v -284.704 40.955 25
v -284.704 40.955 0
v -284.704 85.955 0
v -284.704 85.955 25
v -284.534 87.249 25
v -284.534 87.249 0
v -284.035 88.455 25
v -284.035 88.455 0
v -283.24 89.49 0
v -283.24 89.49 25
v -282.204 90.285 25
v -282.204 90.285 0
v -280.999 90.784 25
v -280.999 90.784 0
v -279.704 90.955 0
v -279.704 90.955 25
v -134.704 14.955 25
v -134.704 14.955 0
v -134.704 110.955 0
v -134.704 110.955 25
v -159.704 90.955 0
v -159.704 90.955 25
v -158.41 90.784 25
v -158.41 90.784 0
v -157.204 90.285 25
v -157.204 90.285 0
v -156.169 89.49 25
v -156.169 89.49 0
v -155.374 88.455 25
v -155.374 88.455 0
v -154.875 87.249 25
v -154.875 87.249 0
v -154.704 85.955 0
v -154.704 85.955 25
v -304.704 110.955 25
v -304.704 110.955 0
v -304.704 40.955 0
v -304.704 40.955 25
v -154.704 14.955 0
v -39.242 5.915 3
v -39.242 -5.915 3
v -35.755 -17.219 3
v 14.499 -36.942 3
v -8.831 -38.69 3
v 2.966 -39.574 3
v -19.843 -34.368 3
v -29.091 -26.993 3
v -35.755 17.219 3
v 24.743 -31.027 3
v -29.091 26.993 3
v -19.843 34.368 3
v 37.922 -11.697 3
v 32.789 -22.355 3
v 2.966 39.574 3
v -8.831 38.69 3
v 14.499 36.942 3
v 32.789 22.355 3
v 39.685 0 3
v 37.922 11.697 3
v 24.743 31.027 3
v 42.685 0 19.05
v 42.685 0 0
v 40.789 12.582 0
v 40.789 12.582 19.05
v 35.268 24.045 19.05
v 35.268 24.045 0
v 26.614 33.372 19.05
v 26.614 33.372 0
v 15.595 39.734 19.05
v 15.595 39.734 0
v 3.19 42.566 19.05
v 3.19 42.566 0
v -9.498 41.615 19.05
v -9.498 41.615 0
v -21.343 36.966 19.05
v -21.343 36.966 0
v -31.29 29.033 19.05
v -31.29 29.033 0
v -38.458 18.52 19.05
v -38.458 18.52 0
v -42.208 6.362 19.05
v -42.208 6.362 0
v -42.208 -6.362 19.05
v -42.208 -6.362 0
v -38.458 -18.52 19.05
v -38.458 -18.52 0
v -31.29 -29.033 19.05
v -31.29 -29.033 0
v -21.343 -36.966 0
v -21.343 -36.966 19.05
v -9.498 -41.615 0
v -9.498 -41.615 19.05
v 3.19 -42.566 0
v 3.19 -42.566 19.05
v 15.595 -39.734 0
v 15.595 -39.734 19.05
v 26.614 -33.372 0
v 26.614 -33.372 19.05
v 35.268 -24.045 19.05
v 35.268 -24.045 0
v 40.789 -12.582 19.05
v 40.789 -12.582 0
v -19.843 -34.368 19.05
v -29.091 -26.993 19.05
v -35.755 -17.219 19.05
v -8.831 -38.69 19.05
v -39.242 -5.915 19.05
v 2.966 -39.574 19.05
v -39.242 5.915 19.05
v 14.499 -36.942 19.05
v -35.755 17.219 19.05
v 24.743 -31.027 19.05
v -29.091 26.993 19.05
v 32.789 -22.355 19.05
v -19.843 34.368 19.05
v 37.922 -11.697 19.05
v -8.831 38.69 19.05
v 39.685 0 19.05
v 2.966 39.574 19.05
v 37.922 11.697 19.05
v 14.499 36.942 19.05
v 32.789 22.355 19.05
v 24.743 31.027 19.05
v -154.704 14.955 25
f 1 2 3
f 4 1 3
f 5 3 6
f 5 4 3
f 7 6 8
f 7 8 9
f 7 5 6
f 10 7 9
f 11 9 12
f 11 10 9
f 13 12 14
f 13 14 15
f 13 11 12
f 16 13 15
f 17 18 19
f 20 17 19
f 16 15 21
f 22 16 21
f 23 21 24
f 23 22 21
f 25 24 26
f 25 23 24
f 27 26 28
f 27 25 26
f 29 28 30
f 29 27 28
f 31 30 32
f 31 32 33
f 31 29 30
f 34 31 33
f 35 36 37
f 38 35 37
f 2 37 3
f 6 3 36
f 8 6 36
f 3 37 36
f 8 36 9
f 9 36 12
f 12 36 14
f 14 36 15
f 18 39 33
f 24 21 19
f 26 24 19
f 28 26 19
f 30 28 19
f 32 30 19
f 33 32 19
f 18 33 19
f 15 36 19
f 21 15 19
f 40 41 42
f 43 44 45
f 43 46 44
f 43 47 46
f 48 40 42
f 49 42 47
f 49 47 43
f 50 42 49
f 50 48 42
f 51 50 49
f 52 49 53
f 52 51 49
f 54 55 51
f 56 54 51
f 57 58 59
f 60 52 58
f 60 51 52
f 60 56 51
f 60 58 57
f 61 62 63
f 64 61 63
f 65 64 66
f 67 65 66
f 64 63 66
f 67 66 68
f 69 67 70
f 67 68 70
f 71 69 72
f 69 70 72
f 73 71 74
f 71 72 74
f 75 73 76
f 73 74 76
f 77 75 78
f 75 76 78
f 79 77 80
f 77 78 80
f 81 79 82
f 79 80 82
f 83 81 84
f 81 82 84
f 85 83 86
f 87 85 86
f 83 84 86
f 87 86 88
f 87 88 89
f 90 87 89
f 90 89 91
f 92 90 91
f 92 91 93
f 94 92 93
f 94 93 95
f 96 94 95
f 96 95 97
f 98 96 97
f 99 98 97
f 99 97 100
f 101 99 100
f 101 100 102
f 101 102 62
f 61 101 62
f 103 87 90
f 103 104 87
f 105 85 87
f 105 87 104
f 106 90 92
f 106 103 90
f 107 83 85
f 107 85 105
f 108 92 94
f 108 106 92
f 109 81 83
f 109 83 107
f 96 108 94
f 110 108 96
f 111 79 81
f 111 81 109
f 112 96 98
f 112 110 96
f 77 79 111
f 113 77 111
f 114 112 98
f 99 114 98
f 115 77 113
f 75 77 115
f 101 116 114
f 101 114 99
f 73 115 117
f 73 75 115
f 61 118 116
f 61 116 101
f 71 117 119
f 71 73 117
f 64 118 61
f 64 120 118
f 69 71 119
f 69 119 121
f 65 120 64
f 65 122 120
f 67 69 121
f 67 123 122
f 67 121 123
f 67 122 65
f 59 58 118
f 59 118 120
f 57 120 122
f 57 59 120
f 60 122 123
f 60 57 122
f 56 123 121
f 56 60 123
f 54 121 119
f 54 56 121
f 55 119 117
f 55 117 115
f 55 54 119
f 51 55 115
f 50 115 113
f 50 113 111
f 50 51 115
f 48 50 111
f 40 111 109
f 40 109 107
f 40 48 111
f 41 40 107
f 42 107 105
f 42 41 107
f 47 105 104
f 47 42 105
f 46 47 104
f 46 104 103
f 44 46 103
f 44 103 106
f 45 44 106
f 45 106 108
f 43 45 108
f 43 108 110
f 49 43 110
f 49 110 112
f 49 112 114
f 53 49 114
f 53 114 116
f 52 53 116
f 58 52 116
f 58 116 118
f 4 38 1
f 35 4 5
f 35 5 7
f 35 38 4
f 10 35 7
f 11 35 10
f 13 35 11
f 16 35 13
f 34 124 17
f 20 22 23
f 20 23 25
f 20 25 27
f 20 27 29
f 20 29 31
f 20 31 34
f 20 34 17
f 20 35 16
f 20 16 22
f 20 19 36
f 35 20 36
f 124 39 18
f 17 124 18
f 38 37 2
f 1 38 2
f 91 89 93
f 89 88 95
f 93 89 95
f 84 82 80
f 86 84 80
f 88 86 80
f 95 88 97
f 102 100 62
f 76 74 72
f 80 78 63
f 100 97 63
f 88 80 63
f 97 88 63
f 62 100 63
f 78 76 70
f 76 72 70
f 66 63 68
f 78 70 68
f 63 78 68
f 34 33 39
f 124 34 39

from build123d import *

# Parameters (mm, degrees)
F0_R     = 42.685
F0_R_2   = 39.685
F1_DEPTH = 3
F2_DEPTH = 19.05
F4_DEPTH = 25
F5_R     = 5


with BuildPart() as f1:
    # F0 (on Top) → F1 (new body)
    with BuildSketch(Plane.XY):
        Circle(F0_R)
        Circle(F0_R_2, mode=Mode.SUBTRACT)
        Circle(F0_R_2)
    extrude(amount=F1_DEPTH)

    # F0 (on Top) → F2 (join)
    with BuildSketch(Plane.XY):
        Circle(F0_R)
        Circle(F0_R_2, mode=Mode.SUBTRACT)
    extrude(amount=F2_DEPTH)


with BuildPart() as f4:
    # F3 (on Top) → F4 (new body)
    with BuildSketch(Plane.XY):
        Polygon((-304.7044279708, 40.9547965858), (-284.7044279708, 40.9547965858), (-284.7044279708, 90.9547965858), (-154.7044279708, 90.9547965858), (-154.7044279708, 14.9547965858), (-134.7044279708, 14.9547965858), (-134.7044279708, 110.9547965858), (-304.7044279708, 110.9547965858), (-304.7044279708, 90.9547965858), align=None)
    extrude(amount=F4_DEPTH)

    # F5
    f5_edges = [f4.edges().sort_by_distance(p)[0] for p in [
        (-284.704428, 90.954797, 12.5),
        (-154.704428, 90.954797, 12.5),
    ]]
    fillet(f5_edges, radius=F5_R)


solid = Compound([f1.part, f4.part])
